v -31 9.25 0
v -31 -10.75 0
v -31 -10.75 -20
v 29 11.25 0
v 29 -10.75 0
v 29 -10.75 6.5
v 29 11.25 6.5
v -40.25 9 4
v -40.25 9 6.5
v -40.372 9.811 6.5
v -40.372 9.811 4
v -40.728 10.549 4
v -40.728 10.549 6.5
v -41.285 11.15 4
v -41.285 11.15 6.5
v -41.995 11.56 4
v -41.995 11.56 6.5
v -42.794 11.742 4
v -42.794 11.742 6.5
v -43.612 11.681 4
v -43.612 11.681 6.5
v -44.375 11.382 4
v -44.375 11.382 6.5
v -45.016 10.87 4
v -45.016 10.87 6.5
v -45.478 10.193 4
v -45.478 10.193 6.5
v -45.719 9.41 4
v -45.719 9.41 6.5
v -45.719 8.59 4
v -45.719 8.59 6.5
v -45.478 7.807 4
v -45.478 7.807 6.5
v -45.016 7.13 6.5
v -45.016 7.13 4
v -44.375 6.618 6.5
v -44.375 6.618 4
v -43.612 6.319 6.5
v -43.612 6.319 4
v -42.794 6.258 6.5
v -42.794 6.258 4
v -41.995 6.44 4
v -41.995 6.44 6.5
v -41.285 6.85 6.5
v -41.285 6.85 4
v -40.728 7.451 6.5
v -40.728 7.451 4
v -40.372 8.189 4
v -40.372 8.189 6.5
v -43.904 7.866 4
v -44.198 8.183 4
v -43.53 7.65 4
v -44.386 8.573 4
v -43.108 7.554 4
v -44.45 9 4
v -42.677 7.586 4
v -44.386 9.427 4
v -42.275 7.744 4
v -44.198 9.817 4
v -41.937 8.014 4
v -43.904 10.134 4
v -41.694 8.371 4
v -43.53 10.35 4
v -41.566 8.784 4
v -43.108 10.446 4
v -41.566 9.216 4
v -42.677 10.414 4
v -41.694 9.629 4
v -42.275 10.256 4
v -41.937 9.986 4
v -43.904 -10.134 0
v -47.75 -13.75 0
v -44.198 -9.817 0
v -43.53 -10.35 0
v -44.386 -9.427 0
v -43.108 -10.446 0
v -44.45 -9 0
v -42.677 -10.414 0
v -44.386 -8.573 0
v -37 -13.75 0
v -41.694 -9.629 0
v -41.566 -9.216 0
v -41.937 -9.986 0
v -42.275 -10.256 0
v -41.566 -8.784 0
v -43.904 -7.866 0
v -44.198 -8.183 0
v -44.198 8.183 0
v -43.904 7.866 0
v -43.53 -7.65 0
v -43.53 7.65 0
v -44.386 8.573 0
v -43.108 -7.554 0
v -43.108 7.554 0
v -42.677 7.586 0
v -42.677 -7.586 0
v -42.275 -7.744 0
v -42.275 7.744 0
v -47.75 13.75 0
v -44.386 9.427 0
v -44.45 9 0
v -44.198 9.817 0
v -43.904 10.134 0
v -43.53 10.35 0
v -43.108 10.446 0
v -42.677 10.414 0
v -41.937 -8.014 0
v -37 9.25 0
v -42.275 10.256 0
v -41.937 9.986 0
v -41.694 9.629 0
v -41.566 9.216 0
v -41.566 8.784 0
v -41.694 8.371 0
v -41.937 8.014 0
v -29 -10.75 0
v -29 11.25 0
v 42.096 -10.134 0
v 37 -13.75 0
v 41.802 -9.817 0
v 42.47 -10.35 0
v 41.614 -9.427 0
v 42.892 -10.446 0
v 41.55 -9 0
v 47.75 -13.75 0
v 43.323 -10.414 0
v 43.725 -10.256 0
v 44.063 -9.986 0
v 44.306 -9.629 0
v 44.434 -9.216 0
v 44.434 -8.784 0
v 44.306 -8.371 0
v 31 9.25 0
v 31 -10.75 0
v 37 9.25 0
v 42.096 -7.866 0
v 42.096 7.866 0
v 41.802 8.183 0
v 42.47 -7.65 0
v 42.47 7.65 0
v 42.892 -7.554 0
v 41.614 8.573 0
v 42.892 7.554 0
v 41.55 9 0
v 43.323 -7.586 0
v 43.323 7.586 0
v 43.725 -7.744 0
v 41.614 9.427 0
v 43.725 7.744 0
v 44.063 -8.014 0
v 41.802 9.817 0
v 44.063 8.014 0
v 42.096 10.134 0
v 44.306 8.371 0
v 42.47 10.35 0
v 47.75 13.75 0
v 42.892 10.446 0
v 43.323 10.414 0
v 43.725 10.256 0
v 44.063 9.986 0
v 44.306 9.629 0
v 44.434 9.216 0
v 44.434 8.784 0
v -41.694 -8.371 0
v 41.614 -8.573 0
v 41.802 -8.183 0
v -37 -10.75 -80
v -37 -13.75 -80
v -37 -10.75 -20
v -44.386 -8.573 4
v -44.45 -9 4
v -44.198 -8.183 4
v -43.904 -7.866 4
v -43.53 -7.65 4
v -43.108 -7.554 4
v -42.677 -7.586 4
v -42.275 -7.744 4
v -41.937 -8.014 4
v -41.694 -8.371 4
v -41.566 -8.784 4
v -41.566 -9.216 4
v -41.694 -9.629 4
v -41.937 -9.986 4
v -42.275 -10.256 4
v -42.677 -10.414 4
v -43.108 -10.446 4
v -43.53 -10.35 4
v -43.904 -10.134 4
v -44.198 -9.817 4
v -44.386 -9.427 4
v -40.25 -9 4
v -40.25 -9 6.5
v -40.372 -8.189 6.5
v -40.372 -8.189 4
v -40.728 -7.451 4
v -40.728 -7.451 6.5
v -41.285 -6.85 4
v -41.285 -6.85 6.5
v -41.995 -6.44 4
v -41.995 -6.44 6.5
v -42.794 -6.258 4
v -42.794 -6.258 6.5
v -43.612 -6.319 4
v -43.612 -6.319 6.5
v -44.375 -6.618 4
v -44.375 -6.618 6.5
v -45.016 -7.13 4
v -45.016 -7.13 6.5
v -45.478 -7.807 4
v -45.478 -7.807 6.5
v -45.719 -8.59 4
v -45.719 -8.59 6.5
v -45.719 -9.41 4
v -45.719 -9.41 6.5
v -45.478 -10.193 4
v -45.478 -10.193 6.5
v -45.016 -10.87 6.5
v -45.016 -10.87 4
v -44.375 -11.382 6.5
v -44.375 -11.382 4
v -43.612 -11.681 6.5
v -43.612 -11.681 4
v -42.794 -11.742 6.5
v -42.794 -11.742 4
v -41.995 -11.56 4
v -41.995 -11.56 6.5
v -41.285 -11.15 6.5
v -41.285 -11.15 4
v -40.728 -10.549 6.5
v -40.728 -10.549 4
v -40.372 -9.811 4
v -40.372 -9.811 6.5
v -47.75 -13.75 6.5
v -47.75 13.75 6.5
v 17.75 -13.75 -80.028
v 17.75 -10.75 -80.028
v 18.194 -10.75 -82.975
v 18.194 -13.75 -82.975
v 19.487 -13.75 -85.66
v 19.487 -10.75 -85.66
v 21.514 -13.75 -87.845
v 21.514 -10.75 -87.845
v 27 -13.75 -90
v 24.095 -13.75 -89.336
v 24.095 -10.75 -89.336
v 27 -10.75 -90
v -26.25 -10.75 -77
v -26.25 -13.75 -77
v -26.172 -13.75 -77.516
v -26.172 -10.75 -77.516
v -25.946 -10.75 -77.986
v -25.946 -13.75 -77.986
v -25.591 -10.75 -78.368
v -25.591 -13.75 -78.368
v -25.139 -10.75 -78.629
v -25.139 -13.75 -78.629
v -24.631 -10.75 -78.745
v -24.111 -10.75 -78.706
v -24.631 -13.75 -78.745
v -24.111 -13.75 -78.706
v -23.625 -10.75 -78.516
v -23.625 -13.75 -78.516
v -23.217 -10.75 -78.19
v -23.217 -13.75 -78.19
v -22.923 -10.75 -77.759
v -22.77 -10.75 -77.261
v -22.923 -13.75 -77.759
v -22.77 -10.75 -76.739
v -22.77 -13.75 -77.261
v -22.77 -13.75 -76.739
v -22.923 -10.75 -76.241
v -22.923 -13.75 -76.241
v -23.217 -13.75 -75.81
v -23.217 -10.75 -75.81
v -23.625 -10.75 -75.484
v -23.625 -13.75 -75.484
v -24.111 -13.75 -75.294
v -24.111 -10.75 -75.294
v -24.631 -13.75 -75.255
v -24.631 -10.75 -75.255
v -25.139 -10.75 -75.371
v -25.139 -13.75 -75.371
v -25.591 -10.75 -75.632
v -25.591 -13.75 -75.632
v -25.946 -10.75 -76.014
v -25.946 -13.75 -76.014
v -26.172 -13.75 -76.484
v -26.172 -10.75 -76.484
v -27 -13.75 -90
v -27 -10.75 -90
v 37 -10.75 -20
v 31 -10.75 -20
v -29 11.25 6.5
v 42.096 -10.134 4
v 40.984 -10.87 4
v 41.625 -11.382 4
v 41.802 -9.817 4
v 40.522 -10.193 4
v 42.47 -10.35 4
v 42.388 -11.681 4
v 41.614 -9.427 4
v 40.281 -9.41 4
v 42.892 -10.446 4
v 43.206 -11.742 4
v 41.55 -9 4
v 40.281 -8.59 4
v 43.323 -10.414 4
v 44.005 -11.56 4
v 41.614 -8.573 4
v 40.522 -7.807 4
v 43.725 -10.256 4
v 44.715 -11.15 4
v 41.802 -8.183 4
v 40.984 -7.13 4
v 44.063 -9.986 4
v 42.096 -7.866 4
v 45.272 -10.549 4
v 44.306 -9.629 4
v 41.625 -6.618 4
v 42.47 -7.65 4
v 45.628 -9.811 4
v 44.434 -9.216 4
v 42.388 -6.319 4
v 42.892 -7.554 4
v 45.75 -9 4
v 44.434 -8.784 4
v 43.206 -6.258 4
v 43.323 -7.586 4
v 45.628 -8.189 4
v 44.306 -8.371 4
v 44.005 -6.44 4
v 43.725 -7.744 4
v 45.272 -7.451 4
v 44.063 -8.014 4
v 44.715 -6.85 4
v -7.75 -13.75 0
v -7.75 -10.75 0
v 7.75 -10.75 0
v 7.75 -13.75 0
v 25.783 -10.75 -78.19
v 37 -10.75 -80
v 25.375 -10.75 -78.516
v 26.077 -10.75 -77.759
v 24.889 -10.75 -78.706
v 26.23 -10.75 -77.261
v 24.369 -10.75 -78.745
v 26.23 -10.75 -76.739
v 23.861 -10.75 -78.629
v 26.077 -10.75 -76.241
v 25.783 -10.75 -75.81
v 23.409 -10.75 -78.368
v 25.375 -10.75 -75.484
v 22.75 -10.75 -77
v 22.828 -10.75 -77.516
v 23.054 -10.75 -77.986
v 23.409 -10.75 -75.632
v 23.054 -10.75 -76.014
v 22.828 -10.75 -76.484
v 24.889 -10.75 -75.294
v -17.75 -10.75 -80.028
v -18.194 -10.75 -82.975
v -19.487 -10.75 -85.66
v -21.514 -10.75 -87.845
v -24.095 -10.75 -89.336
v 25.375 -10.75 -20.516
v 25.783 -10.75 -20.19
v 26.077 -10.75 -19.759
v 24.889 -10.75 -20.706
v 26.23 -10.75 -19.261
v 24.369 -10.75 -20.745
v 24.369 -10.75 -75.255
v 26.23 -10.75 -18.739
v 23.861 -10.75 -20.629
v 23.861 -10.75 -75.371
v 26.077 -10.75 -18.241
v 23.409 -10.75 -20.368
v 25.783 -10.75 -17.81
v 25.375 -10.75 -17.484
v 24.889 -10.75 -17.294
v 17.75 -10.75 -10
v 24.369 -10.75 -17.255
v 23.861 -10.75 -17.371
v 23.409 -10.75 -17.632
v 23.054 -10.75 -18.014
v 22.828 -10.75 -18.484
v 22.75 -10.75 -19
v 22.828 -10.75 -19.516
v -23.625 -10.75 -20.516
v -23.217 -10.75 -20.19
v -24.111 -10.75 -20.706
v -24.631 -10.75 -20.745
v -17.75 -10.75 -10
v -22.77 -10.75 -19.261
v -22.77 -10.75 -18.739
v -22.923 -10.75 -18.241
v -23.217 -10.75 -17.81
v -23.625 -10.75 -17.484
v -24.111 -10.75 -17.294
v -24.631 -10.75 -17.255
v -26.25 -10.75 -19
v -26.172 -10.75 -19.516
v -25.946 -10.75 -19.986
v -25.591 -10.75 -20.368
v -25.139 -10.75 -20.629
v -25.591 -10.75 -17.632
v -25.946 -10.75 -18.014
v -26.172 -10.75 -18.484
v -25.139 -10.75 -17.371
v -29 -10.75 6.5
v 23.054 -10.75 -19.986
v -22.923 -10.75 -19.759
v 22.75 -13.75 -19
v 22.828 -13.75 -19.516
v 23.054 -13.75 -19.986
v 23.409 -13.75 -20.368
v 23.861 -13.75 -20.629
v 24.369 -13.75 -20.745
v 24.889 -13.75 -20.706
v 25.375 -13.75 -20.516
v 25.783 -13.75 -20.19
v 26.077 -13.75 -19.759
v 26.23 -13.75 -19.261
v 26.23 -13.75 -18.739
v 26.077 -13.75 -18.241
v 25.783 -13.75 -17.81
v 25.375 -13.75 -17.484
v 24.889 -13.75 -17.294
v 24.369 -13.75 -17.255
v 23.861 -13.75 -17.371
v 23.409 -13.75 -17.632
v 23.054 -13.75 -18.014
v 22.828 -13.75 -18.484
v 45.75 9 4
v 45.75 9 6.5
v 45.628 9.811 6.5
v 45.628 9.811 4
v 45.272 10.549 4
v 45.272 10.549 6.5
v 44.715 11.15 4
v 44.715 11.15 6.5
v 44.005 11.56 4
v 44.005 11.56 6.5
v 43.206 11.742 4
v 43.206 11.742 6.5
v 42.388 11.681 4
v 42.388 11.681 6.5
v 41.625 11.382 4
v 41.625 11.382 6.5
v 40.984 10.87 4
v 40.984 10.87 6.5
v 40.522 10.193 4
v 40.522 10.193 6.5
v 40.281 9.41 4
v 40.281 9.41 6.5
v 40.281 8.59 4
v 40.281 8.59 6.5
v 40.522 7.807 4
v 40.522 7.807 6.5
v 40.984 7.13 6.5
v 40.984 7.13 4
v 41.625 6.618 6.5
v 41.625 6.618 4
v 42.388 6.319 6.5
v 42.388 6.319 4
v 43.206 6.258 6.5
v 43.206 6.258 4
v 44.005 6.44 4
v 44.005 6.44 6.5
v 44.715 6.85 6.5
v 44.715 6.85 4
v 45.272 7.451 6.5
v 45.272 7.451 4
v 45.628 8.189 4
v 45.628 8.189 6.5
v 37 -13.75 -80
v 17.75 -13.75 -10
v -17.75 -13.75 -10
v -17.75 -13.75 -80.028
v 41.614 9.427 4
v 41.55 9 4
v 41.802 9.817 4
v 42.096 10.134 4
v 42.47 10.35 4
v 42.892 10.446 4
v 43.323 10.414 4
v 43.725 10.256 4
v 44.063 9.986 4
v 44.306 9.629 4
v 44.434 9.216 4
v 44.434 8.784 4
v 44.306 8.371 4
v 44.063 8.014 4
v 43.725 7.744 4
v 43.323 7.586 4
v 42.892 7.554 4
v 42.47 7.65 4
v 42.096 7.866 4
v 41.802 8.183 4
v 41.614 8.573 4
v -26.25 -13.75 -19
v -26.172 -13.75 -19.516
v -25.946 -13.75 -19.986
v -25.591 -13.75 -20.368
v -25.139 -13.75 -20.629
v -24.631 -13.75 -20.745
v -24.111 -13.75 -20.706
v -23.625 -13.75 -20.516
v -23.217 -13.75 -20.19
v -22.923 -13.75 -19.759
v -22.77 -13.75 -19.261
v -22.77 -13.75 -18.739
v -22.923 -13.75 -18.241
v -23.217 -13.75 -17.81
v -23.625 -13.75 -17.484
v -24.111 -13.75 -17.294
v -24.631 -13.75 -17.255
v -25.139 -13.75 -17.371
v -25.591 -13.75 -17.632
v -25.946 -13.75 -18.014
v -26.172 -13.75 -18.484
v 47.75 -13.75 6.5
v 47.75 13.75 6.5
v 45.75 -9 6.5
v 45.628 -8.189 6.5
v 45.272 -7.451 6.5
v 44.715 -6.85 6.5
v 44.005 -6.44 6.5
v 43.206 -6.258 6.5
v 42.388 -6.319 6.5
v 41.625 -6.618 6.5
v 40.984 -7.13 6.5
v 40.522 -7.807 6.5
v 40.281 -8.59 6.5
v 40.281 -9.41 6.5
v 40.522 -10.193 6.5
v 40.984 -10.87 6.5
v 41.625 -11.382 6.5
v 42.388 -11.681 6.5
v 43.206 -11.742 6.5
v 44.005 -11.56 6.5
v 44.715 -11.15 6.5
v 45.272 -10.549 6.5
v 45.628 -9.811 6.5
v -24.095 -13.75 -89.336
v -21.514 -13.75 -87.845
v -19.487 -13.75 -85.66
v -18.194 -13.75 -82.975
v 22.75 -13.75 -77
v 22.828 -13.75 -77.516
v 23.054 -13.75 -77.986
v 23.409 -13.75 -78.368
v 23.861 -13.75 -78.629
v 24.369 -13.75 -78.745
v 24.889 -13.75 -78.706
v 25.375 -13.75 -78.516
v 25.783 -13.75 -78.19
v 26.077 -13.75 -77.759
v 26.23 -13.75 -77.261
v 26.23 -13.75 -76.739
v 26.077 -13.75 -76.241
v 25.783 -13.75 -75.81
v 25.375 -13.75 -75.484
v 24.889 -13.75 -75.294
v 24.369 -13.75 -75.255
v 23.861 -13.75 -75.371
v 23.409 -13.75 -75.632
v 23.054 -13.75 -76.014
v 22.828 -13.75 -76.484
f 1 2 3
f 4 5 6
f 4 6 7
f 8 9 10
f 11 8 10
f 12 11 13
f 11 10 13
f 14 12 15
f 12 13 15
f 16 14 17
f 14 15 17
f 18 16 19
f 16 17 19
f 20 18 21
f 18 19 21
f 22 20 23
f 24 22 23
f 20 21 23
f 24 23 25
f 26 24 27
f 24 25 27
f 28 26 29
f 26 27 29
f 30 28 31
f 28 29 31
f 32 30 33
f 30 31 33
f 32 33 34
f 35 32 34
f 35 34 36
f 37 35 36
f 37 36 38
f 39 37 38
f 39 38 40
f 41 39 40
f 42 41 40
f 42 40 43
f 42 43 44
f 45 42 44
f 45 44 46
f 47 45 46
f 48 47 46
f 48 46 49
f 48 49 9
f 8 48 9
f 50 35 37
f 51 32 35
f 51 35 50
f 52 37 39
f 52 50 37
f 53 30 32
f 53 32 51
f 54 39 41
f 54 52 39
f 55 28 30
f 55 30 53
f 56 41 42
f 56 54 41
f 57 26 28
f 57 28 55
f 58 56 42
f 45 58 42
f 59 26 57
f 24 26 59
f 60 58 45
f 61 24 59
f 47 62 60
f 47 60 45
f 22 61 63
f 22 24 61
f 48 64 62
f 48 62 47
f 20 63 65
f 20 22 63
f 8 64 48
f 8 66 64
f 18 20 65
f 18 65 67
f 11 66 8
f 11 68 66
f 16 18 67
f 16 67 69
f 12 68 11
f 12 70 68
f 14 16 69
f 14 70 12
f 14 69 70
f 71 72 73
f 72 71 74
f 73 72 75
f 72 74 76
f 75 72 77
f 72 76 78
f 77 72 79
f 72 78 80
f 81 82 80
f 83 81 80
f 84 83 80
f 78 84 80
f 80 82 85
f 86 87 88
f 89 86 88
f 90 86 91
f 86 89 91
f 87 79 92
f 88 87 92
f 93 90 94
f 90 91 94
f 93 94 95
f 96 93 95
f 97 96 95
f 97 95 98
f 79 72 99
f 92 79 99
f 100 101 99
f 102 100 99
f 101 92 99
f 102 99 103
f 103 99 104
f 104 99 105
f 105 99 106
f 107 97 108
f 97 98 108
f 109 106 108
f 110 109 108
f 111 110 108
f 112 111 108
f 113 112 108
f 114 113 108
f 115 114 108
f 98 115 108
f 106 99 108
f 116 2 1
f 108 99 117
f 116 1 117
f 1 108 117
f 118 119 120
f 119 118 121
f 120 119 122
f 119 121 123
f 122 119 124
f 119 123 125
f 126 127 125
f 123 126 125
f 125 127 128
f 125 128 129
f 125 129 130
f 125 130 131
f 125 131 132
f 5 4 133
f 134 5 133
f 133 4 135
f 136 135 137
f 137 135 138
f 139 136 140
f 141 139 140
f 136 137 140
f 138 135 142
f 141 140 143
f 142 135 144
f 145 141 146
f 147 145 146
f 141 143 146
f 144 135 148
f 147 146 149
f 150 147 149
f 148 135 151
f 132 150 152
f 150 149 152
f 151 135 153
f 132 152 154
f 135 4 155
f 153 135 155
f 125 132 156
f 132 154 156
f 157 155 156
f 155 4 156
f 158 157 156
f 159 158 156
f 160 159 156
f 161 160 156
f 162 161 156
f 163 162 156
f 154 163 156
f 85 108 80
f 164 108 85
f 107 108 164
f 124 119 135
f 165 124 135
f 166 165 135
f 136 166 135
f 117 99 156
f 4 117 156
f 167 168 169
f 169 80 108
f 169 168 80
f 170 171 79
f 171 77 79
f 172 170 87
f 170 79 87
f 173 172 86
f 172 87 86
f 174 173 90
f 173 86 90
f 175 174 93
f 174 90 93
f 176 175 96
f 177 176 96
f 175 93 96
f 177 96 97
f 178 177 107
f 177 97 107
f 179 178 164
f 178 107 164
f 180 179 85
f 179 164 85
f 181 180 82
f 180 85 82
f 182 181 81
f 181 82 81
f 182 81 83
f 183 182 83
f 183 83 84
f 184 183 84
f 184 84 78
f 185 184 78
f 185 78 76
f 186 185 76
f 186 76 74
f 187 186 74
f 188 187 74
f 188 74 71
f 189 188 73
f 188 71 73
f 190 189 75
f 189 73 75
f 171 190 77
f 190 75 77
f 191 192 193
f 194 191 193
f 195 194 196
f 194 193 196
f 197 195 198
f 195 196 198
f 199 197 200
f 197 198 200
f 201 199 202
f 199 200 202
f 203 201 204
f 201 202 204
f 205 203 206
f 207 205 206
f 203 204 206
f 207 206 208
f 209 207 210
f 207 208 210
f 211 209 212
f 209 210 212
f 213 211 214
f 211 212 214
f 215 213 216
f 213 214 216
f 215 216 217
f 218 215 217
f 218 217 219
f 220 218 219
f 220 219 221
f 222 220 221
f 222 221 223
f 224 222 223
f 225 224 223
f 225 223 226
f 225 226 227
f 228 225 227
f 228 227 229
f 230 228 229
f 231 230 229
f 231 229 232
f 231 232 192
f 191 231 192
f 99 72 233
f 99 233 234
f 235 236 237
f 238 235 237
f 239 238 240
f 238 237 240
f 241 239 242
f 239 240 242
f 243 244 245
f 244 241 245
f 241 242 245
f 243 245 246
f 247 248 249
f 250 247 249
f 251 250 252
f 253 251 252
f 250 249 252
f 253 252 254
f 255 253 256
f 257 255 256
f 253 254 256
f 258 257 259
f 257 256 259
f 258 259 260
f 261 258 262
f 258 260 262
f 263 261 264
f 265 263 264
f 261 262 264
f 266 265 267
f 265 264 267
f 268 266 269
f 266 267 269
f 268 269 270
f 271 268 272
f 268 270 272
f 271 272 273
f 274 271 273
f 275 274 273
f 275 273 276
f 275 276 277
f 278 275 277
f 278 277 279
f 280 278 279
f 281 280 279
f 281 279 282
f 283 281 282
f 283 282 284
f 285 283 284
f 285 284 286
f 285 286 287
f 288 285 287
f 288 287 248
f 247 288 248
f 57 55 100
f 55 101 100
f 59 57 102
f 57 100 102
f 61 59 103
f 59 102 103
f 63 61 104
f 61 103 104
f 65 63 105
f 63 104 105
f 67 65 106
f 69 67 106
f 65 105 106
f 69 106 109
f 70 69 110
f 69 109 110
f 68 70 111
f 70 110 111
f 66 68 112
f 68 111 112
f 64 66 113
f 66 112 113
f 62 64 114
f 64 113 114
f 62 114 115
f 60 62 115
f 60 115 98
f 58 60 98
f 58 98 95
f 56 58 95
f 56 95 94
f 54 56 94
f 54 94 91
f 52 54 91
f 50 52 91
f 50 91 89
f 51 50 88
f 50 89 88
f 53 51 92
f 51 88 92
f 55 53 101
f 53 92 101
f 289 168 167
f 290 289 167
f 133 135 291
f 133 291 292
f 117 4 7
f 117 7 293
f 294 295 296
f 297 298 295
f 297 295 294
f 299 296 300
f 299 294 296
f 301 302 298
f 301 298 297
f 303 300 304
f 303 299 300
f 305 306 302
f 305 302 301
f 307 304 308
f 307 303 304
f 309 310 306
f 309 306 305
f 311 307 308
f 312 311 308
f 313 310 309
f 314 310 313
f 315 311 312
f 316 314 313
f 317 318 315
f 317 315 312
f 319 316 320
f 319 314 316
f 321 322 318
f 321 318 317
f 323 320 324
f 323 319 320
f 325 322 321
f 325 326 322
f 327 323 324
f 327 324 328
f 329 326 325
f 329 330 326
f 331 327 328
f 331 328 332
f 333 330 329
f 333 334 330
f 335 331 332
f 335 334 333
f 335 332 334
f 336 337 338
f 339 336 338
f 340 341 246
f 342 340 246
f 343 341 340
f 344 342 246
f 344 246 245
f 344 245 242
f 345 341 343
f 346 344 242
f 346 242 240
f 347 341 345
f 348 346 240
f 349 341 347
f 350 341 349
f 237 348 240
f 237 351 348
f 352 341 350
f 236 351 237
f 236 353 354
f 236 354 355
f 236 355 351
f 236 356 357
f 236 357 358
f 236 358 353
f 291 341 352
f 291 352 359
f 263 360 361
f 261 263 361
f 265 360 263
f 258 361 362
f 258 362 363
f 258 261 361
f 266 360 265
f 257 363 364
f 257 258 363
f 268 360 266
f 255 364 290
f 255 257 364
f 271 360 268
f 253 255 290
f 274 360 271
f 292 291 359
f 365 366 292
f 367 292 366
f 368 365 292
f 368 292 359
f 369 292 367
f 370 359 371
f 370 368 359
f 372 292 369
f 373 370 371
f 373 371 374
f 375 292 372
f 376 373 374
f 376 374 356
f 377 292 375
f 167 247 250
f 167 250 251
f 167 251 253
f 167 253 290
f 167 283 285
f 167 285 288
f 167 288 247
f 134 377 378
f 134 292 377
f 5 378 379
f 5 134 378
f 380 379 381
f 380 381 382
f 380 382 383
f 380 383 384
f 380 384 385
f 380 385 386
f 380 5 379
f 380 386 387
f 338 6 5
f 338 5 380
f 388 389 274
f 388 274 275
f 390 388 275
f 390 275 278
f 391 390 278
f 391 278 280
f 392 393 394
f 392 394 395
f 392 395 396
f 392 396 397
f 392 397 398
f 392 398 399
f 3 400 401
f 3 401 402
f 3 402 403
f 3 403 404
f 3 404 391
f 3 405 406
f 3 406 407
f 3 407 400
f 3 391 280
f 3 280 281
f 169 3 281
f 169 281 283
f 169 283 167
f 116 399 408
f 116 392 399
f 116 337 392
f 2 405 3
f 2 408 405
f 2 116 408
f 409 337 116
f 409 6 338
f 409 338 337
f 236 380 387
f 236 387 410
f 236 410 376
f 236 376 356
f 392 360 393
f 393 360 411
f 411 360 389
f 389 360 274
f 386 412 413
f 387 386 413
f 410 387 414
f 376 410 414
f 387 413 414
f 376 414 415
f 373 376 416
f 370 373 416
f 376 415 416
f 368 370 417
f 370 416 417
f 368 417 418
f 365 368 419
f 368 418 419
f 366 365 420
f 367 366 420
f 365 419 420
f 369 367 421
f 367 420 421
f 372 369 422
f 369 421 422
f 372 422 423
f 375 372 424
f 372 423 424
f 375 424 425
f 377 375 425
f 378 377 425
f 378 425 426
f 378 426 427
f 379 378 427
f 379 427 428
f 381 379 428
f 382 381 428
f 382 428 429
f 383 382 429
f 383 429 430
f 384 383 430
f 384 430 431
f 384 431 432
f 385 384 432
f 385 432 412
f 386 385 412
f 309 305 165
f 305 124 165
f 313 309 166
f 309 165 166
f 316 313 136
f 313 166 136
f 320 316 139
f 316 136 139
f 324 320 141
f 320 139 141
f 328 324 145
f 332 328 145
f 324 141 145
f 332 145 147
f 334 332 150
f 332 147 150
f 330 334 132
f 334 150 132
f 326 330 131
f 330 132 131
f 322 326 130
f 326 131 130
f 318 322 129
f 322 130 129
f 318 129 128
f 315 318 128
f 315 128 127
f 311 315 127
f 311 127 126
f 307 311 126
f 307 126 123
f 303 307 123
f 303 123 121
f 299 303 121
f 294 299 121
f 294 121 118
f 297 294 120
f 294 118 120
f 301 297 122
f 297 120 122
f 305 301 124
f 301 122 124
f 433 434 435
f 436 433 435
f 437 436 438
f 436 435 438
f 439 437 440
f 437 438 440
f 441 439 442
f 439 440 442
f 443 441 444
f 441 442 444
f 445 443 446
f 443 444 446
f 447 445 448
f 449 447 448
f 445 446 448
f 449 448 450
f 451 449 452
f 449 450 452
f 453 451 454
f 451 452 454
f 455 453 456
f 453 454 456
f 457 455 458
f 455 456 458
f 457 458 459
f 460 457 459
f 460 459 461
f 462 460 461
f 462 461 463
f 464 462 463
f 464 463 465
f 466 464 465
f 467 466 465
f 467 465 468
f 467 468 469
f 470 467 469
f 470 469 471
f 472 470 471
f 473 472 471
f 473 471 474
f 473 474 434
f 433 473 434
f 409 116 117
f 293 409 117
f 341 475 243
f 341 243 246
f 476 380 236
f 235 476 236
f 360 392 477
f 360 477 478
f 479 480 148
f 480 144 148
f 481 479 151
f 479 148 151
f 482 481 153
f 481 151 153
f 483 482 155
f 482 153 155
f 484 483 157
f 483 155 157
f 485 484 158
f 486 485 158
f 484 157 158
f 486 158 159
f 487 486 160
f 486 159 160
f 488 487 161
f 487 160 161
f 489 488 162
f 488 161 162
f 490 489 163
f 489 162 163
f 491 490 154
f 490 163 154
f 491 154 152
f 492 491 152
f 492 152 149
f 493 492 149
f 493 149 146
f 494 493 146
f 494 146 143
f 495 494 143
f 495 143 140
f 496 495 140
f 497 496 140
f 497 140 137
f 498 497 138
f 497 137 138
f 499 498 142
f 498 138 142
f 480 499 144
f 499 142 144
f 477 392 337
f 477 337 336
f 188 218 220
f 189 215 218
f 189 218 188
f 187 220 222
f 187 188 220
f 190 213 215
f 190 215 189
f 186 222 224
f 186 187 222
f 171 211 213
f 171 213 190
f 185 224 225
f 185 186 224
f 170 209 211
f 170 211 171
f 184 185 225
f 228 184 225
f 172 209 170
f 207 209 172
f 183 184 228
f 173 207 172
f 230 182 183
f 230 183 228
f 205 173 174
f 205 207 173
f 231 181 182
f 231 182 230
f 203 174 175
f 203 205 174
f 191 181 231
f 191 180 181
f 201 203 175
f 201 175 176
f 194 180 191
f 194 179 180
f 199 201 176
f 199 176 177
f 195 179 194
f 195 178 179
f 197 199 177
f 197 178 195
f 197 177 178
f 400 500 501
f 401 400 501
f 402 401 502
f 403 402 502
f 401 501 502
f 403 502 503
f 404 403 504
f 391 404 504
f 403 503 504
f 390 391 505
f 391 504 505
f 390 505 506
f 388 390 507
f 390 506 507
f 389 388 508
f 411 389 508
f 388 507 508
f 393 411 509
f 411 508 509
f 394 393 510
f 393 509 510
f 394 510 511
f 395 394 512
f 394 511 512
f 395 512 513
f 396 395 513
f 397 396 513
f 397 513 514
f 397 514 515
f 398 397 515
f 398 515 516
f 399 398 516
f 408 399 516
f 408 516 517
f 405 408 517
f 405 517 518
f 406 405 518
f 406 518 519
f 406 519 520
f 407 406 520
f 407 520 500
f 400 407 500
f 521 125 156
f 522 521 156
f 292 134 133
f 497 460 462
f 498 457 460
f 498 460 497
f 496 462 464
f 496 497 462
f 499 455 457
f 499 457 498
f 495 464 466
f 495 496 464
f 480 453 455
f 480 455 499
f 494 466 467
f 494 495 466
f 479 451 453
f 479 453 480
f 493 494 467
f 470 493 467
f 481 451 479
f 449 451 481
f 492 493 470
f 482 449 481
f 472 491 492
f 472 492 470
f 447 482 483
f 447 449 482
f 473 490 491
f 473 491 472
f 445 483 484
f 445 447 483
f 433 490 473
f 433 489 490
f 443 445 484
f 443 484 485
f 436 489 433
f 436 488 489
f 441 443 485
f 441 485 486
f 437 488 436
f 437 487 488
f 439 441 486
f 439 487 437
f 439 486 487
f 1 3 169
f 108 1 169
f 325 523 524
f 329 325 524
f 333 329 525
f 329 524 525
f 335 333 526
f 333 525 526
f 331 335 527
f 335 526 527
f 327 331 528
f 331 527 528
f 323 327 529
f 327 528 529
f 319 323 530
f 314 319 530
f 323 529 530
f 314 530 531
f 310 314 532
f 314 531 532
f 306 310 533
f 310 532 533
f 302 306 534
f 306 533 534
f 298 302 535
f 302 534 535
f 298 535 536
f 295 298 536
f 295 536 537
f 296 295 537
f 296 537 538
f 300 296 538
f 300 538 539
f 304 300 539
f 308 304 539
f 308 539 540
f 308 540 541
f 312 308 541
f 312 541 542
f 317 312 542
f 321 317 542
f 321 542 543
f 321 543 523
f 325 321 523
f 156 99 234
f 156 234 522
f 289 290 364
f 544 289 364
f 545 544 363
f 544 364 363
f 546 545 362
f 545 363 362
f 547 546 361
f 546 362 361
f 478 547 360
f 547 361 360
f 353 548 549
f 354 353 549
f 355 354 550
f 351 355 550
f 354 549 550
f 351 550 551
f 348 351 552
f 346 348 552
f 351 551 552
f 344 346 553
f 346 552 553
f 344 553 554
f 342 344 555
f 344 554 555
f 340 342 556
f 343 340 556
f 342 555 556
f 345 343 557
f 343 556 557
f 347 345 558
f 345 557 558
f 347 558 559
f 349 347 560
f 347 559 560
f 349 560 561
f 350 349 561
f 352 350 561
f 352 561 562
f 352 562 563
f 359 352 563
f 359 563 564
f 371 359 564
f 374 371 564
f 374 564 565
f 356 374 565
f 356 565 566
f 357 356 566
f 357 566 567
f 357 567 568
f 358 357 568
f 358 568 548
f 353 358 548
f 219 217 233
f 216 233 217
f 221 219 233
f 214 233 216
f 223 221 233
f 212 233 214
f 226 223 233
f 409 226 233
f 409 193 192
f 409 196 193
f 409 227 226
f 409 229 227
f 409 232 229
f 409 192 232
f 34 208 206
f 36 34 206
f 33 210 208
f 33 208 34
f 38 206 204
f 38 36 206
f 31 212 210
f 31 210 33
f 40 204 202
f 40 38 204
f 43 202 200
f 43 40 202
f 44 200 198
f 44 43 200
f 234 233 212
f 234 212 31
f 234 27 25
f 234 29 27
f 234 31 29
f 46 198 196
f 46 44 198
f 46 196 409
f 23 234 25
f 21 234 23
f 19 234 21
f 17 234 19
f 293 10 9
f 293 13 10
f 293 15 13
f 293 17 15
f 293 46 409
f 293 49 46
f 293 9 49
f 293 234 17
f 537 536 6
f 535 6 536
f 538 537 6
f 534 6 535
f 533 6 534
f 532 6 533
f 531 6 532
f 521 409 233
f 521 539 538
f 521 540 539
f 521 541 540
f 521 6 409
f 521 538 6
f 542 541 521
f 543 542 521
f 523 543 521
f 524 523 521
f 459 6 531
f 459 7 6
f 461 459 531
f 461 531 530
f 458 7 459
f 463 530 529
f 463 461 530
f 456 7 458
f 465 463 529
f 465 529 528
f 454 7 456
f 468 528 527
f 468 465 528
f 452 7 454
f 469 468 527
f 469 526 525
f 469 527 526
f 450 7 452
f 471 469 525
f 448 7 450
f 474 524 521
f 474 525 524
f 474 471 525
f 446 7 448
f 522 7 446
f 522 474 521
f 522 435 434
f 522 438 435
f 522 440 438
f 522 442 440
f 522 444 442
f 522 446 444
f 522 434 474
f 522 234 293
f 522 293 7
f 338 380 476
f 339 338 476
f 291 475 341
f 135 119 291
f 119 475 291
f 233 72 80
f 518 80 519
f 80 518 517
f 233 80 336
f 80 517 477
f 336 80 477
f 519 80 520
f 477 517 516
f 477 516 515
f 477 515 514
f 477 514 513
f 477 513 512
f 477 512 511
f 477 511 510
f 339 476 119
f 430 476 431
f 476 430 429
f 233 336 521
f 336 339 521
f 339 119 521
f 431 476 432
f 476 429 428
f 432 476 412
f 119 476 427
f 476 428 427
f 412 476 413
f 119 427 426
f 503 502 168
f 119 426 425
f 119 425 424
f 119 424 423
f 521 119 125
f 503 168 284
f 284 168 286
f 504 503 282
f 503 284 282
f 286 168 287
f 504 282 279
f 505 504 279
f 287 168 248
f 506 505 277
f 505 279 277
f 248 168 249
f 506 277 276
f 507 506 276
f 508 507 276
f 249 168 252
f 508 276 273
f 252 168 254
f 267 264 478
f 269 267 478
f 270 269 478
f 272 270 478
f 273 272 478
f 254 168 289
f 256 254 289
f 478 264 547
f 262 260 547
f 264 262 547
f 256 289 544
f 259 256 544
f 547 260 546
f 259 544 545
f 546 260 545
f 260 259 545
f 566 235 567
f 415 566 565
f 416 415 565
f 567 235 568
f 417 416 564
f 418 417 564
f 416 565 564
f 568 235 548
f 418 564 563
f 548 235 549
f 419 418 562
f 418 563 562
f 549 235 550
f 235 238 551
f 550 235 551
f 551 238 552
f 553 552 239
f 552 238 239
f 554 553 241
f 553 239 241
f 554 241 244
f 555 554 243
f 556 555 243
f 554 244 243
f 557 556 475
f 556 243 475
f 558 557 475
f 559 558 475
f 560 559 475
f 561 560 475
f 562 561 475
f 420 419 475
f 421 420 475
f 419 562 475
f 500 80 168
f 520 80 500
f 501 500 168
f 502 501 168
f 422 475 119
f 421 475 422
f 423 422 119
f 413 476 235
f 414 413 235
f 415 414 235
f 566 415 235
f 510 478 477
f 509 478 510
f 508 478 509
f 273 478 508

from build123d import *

# Parameters (mm, degrees)
SKETCH1_W                        = 95.5
SKETCH1_H                        = 27.5
BOSS_EXTRUDE1_DEPTH              = 6.5
SKETCH2_W                        = 74
SKETCH2_H                        = 3
BOSS_EXTRUDE2_DEPTH              = 90
SKETCH3_W                        = 58
SKETCH3_H                        = 22
CUT_EXTRUDE1_DEPTH               = 90
CBORE_FOR_M2_5_SHCS1_D           = 2.9
CBORE_FOR_M2_5_SHCS1_DEPTH       = 10.1
CBORE_FOR_M2_5_SHCS1_CBORE_D     = 5.5
CBORE_FOR_M2_5_SHCS1_CBORE_DEPTH = 2.5
CBORE_FOR_M2_5_SHCS1_TIP         = 0.871247898
SKETCH7_W                        = 6
SKETCH7_H                        = 20
BOSS_EXTRUDE3_DEPTH              = 20
CHAMFER1_SIZE                    = 20
F_1_0_3_5_DIAMETER_HOLE1_D       = 3.5
F_1_0_3_5_DIAMETER_HOLE1_DEPTH   = 10.1
F_1_0_3_5_DIAMETER_HOLE1_TIP     = 1.051506083
SKETCH12_W                       = 35.5
SKETCH12_H                       = 90
CUT_EXTRUDE2_DEPTH               = 20
CHAMFER2_SIZE                    = 10
FILLET1_R                        = 10


# Some blends are built 0.0001 mm under size
with BuildPart() as part:
    # Sketch1 → Boss-Extrude1 (new body)
    with BuildSketch(Plane.XY):
        Rectangle(SKETCH1_W, SKETCH1_H)
    extrude(amount=BOSS_EXTRUDE1_DEPTH)

    # Sketch2 → Boss-Extrude2 (add)
    with BuildSketch(Plane(origin=(0, 0, 0), x_dir=(-1, 0, 0), z_dir=(0, 0, -1))):
        with Locations((0, -12.25)):
            Rectangle(SKETCH2_W, SKETCH2_H)
    extrude(amount=BOSS_EXTRUDE2_DEPTH)

    # Sketch3 → Cut-Extrude1 (cut)
    with BuildSketch(Plane(origin=(0, 0, 0), x_dir=(-1, 0, 0), z_dir=(0, 0, -1))):
        with Locations((0, 0.25)):
            Rectangle(SKETCH3_W, SKETCH3_H)
    extrude(amount=-CUT_EXTRUDE1_DEPTH, mode=Mode.SUBTRACT)

    # CBORE for M2.5 SHCS1
    with Locations(Plane.XY.offset(6.5)):
        with Locations((-43, 9), (-43, -9), (43, 9), (43, -9)):
            CounterBoreHole(CBORE_FOR_M2_5_SHCS1_D / 2, CBORE_FOR_M2_5_SHCS1_CBORE_D / 2, CBORE_FOR_M2_5_SHCS1_CBORE_DEPTH, depth=CBORE_FOR_M2_5_SHCS1_DEPTH)
            with Locations((0, 0, -(CBORE_FOR_M2_5_SHCS1_DEPTH + CBORE_FOR_M2_5_SHCS1_TIP / 2))):  # 118° drill point
                Cone(0, CBORE_FOR_M2_5_SHCS1_D / 2, CBORE_FOR_M2_5_SHCS1_TIP, mode=Mode.SUBTRACT)

    # Sketch7 → Boss-Extrude3 (add)
    with BuildSketch(Plane(origin=(0, 0, 0), x_dir=(-1, 0, 0), z_dir=(0, 0, -1))):
        with Locations((-34, -0.75)):
            Rectangle(SKETCH7_W, SKETCH7_H)
        with Locations((34, -0.75)):
            Rectangle(SKETCH7_W, SKETCH7_H)
    extrude(amount=BOSS_EXTRUDE3_DEPTH)

    # Chamfer1
    chamfer1_edges = [part.edges().sort_by_distance(p)[0] for p in [
        (34, 9.25, -20),
        (-34, 9.25, -20),
    ]]
    chamfer(chamfer1_edges, length=CHAMFER1_SIZE - 0.0001)  # a hair under: the kernel refuses the full size

    # Ø1.0 (3.5) Diameter Hole1
    with Locations(Plane(origin=(0, -10.75, 0), x_dir=(1, 0, 0), z_dir=(0, 1, 0))):
        with Locations((-24.5, 77), (24.5, 77), (-24.5, 19), (24.5, 19)):
            Hole(F_1_0_3_5_DIAMETER_HOLE1_D / 2, depth=F_1_0_3_5_DIAMETER_HOLE1_DEPTH)
            with Locations((0, 0, -(F_1_0_3_5_DIAMETER_HOLE1_DEPTH + F_1_0_3_5_DIAMETER_HOLE1_TIP / 2))):  # 118° drill point
                Cone(0, F_1_0_3_5_DIAMETER_HOLE1_D / 2, F_1_0_3_5_DIAMETER_HOLE1_TIP, mode=Mode.SUBTRACT)

    # Sketch12 → Cut-Extrude2 (cut)
    with BuildSketch(Plane(origin=(0, -10.75, 0), x_dir=(1, 0, 0), z_dir=(0, 1, 0))):
        with Locations((0, 45)):
            Rectangle(SKETCH12_W, SKETCH12_H)
    extrude(amount=-CUT_EXTRUDE2_DEPTH, mode=Mode.SUBTRACT)

    # Chamfer2
    chamfer2_edges = [part.edges().sort_by_distance(p)[0] for p in [
        (17.75, -12.25, 0),
        (-17.75, -12.25, 0),
        (37, -12.25, -90),
        (-37, -12.25, -90),
    ]]
    chamfer(chamfer2_edges, length=CHAMFER2_SIZE)

    # Fillet1
    # the kernel refuses this fillet: 10 mm, written as the material it takes off along each edge
    with BuildSketch(Plane(origin=(-17.75, 14.179588344, -90), x_dir=(0, 0, 1), z_dir=(0, -1, 0))) as fillet1_piece_1:
        with BuildLine():
            CenterArc((9.971835338, 10), FILLET1_R, 184.301222305, 85.698777695)
            Line((0, 9.25), (-0.199436707, 9.235))
            ThreePointArc((-0.199436707, 9.235), (-0.2, 4.625), (-0.2, 0))
            Line((-0.2, 0), (0, -0.2))
            Line((0, -0.2), (9.971835338, -0.2))
            Line((9.971835338, -0.2), (9.971835338, 0))
        make_face()
    extrude(amount=52.859176688, mode=Mode.SUBTRACT)
    with BuildSketch(Plane(origin=(17.75, 14.179588344, -90), x_dir=(1, 0, 0), z_dir=(0, -1, 0))) as fillet1_piece_2:
        with BuildLine():
            CenterArc((10, 9.971835338), FILLET1_R, 180, 85.698777695)
            Line((0, 9.971835338), (-0.2, 9.971835338))
            Line((-0.2, 9.971835338), (-0.2, 0))
            Line((-0.2, 0), (0, -0.2))
            ThreePointArc((0, -0.2), (4.625, -0.2), (9.235, -0.199436707))
            Line((9.235, -0.199436707), (9.25, 0))
        make_face()
    extrude(amount=52.859176688, mode=Mode.SUBTRACT)


solid = part.part
